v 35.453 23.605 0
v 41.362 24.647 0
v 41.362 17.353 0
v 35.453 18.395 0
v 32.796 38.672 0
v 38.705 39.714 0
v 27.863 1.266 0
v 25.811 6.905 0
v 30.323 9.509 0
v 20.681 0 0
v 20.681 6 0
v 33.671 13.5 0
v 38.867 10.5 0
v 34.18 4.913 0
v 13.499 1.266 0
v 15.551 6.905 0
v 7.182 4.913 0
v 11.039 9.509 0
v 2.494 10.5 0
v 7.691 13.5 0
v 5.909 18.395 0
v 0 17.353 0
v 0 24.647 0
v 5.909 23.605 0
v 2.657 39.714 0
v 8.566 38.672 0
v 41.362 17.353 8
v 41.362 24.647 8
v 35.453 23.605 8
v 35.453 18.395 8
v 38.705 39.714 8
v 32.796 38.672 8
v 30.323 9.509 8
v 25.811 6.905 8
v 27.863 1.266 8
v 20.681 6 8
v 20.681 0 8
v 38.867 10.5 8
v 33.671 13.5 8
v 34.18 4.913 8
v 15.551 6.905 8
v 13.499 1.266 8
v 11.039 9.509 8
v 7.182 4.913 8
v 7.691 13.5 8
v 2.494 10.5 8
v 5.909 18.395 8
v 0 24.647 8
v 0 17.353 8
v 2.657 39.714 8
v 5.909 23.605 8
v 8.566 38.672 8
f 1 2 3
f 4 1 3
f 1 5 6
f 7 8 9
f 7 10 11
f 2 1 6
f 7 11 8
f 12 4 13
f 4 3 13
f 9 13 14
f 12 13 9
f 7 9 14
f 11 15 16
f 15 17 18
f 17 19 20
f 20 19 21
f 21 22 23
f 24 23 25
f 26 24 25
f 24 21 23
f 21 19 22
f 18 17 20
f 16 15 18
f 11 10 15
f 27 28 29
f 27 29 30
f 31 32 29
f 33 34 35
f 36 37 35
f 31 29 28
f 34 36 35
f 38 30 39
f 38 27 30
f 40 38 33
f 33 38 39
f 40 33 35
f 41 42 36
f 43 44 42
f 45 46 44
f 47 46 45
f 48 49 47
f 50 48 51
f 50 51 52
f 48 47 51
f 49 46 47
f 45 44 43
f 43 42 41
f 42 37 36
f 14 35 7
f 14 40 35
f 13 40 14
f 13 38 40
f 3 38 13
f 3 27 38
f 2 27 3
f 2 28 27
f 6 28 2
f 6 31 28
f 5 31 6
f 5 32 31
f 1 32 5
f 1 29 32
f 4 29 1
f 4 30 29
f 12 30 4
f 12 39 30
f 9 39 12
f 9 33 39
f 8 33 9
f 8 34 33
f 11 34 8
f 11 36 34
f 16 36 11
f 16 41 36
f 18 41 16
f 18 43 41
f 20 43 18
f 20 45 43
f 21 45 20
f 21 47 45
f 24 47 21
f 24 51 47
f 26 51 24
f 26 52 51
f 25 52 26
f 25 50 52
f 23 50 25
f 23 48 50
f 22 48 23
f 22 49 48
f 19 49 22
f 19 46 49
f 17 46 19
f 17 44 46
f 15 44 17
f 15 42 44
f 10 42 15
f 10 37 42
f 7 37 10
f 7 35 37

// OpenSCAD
$fn = 32;

// ----------------------------------------------------------------------
// Clip blank: omega clip, 8 mm thick
// ----------------------------------------------------------------------

// --- parameters (mm) ---
profile_height = 8;       // extrusion height
profile_points = 26;      // points of the closed outline

profile = [[0, 24.647], [0, 17.353], [2.494, 10.5], [7.182, 4.913], [13.499, 1.266], [20.681, 0], [27.863, 1.266], [34.18, 4.913], [38.867, 10.5], [41.362, 17.353], [41.362, 24.647], [38.705, 39.714], [32.796, 38.672], [35.453, 23.605], [35.453, 18.395], [33.671, 13.5], [30.323, 9.509], [25.811, 6.905], [20.681, 6], [15.551, 6.905], [11.039, 9.509], [7.691, 13.5], [5.909, 18.395], [5.909, 23.605], [8.566, 38.672], [2.657, 39.714]];  // single closed polygon, 26 points, counter clockwise

// --- the one profile operation ---
linear_extrude(height = profile_height) polygon(points = profile);
